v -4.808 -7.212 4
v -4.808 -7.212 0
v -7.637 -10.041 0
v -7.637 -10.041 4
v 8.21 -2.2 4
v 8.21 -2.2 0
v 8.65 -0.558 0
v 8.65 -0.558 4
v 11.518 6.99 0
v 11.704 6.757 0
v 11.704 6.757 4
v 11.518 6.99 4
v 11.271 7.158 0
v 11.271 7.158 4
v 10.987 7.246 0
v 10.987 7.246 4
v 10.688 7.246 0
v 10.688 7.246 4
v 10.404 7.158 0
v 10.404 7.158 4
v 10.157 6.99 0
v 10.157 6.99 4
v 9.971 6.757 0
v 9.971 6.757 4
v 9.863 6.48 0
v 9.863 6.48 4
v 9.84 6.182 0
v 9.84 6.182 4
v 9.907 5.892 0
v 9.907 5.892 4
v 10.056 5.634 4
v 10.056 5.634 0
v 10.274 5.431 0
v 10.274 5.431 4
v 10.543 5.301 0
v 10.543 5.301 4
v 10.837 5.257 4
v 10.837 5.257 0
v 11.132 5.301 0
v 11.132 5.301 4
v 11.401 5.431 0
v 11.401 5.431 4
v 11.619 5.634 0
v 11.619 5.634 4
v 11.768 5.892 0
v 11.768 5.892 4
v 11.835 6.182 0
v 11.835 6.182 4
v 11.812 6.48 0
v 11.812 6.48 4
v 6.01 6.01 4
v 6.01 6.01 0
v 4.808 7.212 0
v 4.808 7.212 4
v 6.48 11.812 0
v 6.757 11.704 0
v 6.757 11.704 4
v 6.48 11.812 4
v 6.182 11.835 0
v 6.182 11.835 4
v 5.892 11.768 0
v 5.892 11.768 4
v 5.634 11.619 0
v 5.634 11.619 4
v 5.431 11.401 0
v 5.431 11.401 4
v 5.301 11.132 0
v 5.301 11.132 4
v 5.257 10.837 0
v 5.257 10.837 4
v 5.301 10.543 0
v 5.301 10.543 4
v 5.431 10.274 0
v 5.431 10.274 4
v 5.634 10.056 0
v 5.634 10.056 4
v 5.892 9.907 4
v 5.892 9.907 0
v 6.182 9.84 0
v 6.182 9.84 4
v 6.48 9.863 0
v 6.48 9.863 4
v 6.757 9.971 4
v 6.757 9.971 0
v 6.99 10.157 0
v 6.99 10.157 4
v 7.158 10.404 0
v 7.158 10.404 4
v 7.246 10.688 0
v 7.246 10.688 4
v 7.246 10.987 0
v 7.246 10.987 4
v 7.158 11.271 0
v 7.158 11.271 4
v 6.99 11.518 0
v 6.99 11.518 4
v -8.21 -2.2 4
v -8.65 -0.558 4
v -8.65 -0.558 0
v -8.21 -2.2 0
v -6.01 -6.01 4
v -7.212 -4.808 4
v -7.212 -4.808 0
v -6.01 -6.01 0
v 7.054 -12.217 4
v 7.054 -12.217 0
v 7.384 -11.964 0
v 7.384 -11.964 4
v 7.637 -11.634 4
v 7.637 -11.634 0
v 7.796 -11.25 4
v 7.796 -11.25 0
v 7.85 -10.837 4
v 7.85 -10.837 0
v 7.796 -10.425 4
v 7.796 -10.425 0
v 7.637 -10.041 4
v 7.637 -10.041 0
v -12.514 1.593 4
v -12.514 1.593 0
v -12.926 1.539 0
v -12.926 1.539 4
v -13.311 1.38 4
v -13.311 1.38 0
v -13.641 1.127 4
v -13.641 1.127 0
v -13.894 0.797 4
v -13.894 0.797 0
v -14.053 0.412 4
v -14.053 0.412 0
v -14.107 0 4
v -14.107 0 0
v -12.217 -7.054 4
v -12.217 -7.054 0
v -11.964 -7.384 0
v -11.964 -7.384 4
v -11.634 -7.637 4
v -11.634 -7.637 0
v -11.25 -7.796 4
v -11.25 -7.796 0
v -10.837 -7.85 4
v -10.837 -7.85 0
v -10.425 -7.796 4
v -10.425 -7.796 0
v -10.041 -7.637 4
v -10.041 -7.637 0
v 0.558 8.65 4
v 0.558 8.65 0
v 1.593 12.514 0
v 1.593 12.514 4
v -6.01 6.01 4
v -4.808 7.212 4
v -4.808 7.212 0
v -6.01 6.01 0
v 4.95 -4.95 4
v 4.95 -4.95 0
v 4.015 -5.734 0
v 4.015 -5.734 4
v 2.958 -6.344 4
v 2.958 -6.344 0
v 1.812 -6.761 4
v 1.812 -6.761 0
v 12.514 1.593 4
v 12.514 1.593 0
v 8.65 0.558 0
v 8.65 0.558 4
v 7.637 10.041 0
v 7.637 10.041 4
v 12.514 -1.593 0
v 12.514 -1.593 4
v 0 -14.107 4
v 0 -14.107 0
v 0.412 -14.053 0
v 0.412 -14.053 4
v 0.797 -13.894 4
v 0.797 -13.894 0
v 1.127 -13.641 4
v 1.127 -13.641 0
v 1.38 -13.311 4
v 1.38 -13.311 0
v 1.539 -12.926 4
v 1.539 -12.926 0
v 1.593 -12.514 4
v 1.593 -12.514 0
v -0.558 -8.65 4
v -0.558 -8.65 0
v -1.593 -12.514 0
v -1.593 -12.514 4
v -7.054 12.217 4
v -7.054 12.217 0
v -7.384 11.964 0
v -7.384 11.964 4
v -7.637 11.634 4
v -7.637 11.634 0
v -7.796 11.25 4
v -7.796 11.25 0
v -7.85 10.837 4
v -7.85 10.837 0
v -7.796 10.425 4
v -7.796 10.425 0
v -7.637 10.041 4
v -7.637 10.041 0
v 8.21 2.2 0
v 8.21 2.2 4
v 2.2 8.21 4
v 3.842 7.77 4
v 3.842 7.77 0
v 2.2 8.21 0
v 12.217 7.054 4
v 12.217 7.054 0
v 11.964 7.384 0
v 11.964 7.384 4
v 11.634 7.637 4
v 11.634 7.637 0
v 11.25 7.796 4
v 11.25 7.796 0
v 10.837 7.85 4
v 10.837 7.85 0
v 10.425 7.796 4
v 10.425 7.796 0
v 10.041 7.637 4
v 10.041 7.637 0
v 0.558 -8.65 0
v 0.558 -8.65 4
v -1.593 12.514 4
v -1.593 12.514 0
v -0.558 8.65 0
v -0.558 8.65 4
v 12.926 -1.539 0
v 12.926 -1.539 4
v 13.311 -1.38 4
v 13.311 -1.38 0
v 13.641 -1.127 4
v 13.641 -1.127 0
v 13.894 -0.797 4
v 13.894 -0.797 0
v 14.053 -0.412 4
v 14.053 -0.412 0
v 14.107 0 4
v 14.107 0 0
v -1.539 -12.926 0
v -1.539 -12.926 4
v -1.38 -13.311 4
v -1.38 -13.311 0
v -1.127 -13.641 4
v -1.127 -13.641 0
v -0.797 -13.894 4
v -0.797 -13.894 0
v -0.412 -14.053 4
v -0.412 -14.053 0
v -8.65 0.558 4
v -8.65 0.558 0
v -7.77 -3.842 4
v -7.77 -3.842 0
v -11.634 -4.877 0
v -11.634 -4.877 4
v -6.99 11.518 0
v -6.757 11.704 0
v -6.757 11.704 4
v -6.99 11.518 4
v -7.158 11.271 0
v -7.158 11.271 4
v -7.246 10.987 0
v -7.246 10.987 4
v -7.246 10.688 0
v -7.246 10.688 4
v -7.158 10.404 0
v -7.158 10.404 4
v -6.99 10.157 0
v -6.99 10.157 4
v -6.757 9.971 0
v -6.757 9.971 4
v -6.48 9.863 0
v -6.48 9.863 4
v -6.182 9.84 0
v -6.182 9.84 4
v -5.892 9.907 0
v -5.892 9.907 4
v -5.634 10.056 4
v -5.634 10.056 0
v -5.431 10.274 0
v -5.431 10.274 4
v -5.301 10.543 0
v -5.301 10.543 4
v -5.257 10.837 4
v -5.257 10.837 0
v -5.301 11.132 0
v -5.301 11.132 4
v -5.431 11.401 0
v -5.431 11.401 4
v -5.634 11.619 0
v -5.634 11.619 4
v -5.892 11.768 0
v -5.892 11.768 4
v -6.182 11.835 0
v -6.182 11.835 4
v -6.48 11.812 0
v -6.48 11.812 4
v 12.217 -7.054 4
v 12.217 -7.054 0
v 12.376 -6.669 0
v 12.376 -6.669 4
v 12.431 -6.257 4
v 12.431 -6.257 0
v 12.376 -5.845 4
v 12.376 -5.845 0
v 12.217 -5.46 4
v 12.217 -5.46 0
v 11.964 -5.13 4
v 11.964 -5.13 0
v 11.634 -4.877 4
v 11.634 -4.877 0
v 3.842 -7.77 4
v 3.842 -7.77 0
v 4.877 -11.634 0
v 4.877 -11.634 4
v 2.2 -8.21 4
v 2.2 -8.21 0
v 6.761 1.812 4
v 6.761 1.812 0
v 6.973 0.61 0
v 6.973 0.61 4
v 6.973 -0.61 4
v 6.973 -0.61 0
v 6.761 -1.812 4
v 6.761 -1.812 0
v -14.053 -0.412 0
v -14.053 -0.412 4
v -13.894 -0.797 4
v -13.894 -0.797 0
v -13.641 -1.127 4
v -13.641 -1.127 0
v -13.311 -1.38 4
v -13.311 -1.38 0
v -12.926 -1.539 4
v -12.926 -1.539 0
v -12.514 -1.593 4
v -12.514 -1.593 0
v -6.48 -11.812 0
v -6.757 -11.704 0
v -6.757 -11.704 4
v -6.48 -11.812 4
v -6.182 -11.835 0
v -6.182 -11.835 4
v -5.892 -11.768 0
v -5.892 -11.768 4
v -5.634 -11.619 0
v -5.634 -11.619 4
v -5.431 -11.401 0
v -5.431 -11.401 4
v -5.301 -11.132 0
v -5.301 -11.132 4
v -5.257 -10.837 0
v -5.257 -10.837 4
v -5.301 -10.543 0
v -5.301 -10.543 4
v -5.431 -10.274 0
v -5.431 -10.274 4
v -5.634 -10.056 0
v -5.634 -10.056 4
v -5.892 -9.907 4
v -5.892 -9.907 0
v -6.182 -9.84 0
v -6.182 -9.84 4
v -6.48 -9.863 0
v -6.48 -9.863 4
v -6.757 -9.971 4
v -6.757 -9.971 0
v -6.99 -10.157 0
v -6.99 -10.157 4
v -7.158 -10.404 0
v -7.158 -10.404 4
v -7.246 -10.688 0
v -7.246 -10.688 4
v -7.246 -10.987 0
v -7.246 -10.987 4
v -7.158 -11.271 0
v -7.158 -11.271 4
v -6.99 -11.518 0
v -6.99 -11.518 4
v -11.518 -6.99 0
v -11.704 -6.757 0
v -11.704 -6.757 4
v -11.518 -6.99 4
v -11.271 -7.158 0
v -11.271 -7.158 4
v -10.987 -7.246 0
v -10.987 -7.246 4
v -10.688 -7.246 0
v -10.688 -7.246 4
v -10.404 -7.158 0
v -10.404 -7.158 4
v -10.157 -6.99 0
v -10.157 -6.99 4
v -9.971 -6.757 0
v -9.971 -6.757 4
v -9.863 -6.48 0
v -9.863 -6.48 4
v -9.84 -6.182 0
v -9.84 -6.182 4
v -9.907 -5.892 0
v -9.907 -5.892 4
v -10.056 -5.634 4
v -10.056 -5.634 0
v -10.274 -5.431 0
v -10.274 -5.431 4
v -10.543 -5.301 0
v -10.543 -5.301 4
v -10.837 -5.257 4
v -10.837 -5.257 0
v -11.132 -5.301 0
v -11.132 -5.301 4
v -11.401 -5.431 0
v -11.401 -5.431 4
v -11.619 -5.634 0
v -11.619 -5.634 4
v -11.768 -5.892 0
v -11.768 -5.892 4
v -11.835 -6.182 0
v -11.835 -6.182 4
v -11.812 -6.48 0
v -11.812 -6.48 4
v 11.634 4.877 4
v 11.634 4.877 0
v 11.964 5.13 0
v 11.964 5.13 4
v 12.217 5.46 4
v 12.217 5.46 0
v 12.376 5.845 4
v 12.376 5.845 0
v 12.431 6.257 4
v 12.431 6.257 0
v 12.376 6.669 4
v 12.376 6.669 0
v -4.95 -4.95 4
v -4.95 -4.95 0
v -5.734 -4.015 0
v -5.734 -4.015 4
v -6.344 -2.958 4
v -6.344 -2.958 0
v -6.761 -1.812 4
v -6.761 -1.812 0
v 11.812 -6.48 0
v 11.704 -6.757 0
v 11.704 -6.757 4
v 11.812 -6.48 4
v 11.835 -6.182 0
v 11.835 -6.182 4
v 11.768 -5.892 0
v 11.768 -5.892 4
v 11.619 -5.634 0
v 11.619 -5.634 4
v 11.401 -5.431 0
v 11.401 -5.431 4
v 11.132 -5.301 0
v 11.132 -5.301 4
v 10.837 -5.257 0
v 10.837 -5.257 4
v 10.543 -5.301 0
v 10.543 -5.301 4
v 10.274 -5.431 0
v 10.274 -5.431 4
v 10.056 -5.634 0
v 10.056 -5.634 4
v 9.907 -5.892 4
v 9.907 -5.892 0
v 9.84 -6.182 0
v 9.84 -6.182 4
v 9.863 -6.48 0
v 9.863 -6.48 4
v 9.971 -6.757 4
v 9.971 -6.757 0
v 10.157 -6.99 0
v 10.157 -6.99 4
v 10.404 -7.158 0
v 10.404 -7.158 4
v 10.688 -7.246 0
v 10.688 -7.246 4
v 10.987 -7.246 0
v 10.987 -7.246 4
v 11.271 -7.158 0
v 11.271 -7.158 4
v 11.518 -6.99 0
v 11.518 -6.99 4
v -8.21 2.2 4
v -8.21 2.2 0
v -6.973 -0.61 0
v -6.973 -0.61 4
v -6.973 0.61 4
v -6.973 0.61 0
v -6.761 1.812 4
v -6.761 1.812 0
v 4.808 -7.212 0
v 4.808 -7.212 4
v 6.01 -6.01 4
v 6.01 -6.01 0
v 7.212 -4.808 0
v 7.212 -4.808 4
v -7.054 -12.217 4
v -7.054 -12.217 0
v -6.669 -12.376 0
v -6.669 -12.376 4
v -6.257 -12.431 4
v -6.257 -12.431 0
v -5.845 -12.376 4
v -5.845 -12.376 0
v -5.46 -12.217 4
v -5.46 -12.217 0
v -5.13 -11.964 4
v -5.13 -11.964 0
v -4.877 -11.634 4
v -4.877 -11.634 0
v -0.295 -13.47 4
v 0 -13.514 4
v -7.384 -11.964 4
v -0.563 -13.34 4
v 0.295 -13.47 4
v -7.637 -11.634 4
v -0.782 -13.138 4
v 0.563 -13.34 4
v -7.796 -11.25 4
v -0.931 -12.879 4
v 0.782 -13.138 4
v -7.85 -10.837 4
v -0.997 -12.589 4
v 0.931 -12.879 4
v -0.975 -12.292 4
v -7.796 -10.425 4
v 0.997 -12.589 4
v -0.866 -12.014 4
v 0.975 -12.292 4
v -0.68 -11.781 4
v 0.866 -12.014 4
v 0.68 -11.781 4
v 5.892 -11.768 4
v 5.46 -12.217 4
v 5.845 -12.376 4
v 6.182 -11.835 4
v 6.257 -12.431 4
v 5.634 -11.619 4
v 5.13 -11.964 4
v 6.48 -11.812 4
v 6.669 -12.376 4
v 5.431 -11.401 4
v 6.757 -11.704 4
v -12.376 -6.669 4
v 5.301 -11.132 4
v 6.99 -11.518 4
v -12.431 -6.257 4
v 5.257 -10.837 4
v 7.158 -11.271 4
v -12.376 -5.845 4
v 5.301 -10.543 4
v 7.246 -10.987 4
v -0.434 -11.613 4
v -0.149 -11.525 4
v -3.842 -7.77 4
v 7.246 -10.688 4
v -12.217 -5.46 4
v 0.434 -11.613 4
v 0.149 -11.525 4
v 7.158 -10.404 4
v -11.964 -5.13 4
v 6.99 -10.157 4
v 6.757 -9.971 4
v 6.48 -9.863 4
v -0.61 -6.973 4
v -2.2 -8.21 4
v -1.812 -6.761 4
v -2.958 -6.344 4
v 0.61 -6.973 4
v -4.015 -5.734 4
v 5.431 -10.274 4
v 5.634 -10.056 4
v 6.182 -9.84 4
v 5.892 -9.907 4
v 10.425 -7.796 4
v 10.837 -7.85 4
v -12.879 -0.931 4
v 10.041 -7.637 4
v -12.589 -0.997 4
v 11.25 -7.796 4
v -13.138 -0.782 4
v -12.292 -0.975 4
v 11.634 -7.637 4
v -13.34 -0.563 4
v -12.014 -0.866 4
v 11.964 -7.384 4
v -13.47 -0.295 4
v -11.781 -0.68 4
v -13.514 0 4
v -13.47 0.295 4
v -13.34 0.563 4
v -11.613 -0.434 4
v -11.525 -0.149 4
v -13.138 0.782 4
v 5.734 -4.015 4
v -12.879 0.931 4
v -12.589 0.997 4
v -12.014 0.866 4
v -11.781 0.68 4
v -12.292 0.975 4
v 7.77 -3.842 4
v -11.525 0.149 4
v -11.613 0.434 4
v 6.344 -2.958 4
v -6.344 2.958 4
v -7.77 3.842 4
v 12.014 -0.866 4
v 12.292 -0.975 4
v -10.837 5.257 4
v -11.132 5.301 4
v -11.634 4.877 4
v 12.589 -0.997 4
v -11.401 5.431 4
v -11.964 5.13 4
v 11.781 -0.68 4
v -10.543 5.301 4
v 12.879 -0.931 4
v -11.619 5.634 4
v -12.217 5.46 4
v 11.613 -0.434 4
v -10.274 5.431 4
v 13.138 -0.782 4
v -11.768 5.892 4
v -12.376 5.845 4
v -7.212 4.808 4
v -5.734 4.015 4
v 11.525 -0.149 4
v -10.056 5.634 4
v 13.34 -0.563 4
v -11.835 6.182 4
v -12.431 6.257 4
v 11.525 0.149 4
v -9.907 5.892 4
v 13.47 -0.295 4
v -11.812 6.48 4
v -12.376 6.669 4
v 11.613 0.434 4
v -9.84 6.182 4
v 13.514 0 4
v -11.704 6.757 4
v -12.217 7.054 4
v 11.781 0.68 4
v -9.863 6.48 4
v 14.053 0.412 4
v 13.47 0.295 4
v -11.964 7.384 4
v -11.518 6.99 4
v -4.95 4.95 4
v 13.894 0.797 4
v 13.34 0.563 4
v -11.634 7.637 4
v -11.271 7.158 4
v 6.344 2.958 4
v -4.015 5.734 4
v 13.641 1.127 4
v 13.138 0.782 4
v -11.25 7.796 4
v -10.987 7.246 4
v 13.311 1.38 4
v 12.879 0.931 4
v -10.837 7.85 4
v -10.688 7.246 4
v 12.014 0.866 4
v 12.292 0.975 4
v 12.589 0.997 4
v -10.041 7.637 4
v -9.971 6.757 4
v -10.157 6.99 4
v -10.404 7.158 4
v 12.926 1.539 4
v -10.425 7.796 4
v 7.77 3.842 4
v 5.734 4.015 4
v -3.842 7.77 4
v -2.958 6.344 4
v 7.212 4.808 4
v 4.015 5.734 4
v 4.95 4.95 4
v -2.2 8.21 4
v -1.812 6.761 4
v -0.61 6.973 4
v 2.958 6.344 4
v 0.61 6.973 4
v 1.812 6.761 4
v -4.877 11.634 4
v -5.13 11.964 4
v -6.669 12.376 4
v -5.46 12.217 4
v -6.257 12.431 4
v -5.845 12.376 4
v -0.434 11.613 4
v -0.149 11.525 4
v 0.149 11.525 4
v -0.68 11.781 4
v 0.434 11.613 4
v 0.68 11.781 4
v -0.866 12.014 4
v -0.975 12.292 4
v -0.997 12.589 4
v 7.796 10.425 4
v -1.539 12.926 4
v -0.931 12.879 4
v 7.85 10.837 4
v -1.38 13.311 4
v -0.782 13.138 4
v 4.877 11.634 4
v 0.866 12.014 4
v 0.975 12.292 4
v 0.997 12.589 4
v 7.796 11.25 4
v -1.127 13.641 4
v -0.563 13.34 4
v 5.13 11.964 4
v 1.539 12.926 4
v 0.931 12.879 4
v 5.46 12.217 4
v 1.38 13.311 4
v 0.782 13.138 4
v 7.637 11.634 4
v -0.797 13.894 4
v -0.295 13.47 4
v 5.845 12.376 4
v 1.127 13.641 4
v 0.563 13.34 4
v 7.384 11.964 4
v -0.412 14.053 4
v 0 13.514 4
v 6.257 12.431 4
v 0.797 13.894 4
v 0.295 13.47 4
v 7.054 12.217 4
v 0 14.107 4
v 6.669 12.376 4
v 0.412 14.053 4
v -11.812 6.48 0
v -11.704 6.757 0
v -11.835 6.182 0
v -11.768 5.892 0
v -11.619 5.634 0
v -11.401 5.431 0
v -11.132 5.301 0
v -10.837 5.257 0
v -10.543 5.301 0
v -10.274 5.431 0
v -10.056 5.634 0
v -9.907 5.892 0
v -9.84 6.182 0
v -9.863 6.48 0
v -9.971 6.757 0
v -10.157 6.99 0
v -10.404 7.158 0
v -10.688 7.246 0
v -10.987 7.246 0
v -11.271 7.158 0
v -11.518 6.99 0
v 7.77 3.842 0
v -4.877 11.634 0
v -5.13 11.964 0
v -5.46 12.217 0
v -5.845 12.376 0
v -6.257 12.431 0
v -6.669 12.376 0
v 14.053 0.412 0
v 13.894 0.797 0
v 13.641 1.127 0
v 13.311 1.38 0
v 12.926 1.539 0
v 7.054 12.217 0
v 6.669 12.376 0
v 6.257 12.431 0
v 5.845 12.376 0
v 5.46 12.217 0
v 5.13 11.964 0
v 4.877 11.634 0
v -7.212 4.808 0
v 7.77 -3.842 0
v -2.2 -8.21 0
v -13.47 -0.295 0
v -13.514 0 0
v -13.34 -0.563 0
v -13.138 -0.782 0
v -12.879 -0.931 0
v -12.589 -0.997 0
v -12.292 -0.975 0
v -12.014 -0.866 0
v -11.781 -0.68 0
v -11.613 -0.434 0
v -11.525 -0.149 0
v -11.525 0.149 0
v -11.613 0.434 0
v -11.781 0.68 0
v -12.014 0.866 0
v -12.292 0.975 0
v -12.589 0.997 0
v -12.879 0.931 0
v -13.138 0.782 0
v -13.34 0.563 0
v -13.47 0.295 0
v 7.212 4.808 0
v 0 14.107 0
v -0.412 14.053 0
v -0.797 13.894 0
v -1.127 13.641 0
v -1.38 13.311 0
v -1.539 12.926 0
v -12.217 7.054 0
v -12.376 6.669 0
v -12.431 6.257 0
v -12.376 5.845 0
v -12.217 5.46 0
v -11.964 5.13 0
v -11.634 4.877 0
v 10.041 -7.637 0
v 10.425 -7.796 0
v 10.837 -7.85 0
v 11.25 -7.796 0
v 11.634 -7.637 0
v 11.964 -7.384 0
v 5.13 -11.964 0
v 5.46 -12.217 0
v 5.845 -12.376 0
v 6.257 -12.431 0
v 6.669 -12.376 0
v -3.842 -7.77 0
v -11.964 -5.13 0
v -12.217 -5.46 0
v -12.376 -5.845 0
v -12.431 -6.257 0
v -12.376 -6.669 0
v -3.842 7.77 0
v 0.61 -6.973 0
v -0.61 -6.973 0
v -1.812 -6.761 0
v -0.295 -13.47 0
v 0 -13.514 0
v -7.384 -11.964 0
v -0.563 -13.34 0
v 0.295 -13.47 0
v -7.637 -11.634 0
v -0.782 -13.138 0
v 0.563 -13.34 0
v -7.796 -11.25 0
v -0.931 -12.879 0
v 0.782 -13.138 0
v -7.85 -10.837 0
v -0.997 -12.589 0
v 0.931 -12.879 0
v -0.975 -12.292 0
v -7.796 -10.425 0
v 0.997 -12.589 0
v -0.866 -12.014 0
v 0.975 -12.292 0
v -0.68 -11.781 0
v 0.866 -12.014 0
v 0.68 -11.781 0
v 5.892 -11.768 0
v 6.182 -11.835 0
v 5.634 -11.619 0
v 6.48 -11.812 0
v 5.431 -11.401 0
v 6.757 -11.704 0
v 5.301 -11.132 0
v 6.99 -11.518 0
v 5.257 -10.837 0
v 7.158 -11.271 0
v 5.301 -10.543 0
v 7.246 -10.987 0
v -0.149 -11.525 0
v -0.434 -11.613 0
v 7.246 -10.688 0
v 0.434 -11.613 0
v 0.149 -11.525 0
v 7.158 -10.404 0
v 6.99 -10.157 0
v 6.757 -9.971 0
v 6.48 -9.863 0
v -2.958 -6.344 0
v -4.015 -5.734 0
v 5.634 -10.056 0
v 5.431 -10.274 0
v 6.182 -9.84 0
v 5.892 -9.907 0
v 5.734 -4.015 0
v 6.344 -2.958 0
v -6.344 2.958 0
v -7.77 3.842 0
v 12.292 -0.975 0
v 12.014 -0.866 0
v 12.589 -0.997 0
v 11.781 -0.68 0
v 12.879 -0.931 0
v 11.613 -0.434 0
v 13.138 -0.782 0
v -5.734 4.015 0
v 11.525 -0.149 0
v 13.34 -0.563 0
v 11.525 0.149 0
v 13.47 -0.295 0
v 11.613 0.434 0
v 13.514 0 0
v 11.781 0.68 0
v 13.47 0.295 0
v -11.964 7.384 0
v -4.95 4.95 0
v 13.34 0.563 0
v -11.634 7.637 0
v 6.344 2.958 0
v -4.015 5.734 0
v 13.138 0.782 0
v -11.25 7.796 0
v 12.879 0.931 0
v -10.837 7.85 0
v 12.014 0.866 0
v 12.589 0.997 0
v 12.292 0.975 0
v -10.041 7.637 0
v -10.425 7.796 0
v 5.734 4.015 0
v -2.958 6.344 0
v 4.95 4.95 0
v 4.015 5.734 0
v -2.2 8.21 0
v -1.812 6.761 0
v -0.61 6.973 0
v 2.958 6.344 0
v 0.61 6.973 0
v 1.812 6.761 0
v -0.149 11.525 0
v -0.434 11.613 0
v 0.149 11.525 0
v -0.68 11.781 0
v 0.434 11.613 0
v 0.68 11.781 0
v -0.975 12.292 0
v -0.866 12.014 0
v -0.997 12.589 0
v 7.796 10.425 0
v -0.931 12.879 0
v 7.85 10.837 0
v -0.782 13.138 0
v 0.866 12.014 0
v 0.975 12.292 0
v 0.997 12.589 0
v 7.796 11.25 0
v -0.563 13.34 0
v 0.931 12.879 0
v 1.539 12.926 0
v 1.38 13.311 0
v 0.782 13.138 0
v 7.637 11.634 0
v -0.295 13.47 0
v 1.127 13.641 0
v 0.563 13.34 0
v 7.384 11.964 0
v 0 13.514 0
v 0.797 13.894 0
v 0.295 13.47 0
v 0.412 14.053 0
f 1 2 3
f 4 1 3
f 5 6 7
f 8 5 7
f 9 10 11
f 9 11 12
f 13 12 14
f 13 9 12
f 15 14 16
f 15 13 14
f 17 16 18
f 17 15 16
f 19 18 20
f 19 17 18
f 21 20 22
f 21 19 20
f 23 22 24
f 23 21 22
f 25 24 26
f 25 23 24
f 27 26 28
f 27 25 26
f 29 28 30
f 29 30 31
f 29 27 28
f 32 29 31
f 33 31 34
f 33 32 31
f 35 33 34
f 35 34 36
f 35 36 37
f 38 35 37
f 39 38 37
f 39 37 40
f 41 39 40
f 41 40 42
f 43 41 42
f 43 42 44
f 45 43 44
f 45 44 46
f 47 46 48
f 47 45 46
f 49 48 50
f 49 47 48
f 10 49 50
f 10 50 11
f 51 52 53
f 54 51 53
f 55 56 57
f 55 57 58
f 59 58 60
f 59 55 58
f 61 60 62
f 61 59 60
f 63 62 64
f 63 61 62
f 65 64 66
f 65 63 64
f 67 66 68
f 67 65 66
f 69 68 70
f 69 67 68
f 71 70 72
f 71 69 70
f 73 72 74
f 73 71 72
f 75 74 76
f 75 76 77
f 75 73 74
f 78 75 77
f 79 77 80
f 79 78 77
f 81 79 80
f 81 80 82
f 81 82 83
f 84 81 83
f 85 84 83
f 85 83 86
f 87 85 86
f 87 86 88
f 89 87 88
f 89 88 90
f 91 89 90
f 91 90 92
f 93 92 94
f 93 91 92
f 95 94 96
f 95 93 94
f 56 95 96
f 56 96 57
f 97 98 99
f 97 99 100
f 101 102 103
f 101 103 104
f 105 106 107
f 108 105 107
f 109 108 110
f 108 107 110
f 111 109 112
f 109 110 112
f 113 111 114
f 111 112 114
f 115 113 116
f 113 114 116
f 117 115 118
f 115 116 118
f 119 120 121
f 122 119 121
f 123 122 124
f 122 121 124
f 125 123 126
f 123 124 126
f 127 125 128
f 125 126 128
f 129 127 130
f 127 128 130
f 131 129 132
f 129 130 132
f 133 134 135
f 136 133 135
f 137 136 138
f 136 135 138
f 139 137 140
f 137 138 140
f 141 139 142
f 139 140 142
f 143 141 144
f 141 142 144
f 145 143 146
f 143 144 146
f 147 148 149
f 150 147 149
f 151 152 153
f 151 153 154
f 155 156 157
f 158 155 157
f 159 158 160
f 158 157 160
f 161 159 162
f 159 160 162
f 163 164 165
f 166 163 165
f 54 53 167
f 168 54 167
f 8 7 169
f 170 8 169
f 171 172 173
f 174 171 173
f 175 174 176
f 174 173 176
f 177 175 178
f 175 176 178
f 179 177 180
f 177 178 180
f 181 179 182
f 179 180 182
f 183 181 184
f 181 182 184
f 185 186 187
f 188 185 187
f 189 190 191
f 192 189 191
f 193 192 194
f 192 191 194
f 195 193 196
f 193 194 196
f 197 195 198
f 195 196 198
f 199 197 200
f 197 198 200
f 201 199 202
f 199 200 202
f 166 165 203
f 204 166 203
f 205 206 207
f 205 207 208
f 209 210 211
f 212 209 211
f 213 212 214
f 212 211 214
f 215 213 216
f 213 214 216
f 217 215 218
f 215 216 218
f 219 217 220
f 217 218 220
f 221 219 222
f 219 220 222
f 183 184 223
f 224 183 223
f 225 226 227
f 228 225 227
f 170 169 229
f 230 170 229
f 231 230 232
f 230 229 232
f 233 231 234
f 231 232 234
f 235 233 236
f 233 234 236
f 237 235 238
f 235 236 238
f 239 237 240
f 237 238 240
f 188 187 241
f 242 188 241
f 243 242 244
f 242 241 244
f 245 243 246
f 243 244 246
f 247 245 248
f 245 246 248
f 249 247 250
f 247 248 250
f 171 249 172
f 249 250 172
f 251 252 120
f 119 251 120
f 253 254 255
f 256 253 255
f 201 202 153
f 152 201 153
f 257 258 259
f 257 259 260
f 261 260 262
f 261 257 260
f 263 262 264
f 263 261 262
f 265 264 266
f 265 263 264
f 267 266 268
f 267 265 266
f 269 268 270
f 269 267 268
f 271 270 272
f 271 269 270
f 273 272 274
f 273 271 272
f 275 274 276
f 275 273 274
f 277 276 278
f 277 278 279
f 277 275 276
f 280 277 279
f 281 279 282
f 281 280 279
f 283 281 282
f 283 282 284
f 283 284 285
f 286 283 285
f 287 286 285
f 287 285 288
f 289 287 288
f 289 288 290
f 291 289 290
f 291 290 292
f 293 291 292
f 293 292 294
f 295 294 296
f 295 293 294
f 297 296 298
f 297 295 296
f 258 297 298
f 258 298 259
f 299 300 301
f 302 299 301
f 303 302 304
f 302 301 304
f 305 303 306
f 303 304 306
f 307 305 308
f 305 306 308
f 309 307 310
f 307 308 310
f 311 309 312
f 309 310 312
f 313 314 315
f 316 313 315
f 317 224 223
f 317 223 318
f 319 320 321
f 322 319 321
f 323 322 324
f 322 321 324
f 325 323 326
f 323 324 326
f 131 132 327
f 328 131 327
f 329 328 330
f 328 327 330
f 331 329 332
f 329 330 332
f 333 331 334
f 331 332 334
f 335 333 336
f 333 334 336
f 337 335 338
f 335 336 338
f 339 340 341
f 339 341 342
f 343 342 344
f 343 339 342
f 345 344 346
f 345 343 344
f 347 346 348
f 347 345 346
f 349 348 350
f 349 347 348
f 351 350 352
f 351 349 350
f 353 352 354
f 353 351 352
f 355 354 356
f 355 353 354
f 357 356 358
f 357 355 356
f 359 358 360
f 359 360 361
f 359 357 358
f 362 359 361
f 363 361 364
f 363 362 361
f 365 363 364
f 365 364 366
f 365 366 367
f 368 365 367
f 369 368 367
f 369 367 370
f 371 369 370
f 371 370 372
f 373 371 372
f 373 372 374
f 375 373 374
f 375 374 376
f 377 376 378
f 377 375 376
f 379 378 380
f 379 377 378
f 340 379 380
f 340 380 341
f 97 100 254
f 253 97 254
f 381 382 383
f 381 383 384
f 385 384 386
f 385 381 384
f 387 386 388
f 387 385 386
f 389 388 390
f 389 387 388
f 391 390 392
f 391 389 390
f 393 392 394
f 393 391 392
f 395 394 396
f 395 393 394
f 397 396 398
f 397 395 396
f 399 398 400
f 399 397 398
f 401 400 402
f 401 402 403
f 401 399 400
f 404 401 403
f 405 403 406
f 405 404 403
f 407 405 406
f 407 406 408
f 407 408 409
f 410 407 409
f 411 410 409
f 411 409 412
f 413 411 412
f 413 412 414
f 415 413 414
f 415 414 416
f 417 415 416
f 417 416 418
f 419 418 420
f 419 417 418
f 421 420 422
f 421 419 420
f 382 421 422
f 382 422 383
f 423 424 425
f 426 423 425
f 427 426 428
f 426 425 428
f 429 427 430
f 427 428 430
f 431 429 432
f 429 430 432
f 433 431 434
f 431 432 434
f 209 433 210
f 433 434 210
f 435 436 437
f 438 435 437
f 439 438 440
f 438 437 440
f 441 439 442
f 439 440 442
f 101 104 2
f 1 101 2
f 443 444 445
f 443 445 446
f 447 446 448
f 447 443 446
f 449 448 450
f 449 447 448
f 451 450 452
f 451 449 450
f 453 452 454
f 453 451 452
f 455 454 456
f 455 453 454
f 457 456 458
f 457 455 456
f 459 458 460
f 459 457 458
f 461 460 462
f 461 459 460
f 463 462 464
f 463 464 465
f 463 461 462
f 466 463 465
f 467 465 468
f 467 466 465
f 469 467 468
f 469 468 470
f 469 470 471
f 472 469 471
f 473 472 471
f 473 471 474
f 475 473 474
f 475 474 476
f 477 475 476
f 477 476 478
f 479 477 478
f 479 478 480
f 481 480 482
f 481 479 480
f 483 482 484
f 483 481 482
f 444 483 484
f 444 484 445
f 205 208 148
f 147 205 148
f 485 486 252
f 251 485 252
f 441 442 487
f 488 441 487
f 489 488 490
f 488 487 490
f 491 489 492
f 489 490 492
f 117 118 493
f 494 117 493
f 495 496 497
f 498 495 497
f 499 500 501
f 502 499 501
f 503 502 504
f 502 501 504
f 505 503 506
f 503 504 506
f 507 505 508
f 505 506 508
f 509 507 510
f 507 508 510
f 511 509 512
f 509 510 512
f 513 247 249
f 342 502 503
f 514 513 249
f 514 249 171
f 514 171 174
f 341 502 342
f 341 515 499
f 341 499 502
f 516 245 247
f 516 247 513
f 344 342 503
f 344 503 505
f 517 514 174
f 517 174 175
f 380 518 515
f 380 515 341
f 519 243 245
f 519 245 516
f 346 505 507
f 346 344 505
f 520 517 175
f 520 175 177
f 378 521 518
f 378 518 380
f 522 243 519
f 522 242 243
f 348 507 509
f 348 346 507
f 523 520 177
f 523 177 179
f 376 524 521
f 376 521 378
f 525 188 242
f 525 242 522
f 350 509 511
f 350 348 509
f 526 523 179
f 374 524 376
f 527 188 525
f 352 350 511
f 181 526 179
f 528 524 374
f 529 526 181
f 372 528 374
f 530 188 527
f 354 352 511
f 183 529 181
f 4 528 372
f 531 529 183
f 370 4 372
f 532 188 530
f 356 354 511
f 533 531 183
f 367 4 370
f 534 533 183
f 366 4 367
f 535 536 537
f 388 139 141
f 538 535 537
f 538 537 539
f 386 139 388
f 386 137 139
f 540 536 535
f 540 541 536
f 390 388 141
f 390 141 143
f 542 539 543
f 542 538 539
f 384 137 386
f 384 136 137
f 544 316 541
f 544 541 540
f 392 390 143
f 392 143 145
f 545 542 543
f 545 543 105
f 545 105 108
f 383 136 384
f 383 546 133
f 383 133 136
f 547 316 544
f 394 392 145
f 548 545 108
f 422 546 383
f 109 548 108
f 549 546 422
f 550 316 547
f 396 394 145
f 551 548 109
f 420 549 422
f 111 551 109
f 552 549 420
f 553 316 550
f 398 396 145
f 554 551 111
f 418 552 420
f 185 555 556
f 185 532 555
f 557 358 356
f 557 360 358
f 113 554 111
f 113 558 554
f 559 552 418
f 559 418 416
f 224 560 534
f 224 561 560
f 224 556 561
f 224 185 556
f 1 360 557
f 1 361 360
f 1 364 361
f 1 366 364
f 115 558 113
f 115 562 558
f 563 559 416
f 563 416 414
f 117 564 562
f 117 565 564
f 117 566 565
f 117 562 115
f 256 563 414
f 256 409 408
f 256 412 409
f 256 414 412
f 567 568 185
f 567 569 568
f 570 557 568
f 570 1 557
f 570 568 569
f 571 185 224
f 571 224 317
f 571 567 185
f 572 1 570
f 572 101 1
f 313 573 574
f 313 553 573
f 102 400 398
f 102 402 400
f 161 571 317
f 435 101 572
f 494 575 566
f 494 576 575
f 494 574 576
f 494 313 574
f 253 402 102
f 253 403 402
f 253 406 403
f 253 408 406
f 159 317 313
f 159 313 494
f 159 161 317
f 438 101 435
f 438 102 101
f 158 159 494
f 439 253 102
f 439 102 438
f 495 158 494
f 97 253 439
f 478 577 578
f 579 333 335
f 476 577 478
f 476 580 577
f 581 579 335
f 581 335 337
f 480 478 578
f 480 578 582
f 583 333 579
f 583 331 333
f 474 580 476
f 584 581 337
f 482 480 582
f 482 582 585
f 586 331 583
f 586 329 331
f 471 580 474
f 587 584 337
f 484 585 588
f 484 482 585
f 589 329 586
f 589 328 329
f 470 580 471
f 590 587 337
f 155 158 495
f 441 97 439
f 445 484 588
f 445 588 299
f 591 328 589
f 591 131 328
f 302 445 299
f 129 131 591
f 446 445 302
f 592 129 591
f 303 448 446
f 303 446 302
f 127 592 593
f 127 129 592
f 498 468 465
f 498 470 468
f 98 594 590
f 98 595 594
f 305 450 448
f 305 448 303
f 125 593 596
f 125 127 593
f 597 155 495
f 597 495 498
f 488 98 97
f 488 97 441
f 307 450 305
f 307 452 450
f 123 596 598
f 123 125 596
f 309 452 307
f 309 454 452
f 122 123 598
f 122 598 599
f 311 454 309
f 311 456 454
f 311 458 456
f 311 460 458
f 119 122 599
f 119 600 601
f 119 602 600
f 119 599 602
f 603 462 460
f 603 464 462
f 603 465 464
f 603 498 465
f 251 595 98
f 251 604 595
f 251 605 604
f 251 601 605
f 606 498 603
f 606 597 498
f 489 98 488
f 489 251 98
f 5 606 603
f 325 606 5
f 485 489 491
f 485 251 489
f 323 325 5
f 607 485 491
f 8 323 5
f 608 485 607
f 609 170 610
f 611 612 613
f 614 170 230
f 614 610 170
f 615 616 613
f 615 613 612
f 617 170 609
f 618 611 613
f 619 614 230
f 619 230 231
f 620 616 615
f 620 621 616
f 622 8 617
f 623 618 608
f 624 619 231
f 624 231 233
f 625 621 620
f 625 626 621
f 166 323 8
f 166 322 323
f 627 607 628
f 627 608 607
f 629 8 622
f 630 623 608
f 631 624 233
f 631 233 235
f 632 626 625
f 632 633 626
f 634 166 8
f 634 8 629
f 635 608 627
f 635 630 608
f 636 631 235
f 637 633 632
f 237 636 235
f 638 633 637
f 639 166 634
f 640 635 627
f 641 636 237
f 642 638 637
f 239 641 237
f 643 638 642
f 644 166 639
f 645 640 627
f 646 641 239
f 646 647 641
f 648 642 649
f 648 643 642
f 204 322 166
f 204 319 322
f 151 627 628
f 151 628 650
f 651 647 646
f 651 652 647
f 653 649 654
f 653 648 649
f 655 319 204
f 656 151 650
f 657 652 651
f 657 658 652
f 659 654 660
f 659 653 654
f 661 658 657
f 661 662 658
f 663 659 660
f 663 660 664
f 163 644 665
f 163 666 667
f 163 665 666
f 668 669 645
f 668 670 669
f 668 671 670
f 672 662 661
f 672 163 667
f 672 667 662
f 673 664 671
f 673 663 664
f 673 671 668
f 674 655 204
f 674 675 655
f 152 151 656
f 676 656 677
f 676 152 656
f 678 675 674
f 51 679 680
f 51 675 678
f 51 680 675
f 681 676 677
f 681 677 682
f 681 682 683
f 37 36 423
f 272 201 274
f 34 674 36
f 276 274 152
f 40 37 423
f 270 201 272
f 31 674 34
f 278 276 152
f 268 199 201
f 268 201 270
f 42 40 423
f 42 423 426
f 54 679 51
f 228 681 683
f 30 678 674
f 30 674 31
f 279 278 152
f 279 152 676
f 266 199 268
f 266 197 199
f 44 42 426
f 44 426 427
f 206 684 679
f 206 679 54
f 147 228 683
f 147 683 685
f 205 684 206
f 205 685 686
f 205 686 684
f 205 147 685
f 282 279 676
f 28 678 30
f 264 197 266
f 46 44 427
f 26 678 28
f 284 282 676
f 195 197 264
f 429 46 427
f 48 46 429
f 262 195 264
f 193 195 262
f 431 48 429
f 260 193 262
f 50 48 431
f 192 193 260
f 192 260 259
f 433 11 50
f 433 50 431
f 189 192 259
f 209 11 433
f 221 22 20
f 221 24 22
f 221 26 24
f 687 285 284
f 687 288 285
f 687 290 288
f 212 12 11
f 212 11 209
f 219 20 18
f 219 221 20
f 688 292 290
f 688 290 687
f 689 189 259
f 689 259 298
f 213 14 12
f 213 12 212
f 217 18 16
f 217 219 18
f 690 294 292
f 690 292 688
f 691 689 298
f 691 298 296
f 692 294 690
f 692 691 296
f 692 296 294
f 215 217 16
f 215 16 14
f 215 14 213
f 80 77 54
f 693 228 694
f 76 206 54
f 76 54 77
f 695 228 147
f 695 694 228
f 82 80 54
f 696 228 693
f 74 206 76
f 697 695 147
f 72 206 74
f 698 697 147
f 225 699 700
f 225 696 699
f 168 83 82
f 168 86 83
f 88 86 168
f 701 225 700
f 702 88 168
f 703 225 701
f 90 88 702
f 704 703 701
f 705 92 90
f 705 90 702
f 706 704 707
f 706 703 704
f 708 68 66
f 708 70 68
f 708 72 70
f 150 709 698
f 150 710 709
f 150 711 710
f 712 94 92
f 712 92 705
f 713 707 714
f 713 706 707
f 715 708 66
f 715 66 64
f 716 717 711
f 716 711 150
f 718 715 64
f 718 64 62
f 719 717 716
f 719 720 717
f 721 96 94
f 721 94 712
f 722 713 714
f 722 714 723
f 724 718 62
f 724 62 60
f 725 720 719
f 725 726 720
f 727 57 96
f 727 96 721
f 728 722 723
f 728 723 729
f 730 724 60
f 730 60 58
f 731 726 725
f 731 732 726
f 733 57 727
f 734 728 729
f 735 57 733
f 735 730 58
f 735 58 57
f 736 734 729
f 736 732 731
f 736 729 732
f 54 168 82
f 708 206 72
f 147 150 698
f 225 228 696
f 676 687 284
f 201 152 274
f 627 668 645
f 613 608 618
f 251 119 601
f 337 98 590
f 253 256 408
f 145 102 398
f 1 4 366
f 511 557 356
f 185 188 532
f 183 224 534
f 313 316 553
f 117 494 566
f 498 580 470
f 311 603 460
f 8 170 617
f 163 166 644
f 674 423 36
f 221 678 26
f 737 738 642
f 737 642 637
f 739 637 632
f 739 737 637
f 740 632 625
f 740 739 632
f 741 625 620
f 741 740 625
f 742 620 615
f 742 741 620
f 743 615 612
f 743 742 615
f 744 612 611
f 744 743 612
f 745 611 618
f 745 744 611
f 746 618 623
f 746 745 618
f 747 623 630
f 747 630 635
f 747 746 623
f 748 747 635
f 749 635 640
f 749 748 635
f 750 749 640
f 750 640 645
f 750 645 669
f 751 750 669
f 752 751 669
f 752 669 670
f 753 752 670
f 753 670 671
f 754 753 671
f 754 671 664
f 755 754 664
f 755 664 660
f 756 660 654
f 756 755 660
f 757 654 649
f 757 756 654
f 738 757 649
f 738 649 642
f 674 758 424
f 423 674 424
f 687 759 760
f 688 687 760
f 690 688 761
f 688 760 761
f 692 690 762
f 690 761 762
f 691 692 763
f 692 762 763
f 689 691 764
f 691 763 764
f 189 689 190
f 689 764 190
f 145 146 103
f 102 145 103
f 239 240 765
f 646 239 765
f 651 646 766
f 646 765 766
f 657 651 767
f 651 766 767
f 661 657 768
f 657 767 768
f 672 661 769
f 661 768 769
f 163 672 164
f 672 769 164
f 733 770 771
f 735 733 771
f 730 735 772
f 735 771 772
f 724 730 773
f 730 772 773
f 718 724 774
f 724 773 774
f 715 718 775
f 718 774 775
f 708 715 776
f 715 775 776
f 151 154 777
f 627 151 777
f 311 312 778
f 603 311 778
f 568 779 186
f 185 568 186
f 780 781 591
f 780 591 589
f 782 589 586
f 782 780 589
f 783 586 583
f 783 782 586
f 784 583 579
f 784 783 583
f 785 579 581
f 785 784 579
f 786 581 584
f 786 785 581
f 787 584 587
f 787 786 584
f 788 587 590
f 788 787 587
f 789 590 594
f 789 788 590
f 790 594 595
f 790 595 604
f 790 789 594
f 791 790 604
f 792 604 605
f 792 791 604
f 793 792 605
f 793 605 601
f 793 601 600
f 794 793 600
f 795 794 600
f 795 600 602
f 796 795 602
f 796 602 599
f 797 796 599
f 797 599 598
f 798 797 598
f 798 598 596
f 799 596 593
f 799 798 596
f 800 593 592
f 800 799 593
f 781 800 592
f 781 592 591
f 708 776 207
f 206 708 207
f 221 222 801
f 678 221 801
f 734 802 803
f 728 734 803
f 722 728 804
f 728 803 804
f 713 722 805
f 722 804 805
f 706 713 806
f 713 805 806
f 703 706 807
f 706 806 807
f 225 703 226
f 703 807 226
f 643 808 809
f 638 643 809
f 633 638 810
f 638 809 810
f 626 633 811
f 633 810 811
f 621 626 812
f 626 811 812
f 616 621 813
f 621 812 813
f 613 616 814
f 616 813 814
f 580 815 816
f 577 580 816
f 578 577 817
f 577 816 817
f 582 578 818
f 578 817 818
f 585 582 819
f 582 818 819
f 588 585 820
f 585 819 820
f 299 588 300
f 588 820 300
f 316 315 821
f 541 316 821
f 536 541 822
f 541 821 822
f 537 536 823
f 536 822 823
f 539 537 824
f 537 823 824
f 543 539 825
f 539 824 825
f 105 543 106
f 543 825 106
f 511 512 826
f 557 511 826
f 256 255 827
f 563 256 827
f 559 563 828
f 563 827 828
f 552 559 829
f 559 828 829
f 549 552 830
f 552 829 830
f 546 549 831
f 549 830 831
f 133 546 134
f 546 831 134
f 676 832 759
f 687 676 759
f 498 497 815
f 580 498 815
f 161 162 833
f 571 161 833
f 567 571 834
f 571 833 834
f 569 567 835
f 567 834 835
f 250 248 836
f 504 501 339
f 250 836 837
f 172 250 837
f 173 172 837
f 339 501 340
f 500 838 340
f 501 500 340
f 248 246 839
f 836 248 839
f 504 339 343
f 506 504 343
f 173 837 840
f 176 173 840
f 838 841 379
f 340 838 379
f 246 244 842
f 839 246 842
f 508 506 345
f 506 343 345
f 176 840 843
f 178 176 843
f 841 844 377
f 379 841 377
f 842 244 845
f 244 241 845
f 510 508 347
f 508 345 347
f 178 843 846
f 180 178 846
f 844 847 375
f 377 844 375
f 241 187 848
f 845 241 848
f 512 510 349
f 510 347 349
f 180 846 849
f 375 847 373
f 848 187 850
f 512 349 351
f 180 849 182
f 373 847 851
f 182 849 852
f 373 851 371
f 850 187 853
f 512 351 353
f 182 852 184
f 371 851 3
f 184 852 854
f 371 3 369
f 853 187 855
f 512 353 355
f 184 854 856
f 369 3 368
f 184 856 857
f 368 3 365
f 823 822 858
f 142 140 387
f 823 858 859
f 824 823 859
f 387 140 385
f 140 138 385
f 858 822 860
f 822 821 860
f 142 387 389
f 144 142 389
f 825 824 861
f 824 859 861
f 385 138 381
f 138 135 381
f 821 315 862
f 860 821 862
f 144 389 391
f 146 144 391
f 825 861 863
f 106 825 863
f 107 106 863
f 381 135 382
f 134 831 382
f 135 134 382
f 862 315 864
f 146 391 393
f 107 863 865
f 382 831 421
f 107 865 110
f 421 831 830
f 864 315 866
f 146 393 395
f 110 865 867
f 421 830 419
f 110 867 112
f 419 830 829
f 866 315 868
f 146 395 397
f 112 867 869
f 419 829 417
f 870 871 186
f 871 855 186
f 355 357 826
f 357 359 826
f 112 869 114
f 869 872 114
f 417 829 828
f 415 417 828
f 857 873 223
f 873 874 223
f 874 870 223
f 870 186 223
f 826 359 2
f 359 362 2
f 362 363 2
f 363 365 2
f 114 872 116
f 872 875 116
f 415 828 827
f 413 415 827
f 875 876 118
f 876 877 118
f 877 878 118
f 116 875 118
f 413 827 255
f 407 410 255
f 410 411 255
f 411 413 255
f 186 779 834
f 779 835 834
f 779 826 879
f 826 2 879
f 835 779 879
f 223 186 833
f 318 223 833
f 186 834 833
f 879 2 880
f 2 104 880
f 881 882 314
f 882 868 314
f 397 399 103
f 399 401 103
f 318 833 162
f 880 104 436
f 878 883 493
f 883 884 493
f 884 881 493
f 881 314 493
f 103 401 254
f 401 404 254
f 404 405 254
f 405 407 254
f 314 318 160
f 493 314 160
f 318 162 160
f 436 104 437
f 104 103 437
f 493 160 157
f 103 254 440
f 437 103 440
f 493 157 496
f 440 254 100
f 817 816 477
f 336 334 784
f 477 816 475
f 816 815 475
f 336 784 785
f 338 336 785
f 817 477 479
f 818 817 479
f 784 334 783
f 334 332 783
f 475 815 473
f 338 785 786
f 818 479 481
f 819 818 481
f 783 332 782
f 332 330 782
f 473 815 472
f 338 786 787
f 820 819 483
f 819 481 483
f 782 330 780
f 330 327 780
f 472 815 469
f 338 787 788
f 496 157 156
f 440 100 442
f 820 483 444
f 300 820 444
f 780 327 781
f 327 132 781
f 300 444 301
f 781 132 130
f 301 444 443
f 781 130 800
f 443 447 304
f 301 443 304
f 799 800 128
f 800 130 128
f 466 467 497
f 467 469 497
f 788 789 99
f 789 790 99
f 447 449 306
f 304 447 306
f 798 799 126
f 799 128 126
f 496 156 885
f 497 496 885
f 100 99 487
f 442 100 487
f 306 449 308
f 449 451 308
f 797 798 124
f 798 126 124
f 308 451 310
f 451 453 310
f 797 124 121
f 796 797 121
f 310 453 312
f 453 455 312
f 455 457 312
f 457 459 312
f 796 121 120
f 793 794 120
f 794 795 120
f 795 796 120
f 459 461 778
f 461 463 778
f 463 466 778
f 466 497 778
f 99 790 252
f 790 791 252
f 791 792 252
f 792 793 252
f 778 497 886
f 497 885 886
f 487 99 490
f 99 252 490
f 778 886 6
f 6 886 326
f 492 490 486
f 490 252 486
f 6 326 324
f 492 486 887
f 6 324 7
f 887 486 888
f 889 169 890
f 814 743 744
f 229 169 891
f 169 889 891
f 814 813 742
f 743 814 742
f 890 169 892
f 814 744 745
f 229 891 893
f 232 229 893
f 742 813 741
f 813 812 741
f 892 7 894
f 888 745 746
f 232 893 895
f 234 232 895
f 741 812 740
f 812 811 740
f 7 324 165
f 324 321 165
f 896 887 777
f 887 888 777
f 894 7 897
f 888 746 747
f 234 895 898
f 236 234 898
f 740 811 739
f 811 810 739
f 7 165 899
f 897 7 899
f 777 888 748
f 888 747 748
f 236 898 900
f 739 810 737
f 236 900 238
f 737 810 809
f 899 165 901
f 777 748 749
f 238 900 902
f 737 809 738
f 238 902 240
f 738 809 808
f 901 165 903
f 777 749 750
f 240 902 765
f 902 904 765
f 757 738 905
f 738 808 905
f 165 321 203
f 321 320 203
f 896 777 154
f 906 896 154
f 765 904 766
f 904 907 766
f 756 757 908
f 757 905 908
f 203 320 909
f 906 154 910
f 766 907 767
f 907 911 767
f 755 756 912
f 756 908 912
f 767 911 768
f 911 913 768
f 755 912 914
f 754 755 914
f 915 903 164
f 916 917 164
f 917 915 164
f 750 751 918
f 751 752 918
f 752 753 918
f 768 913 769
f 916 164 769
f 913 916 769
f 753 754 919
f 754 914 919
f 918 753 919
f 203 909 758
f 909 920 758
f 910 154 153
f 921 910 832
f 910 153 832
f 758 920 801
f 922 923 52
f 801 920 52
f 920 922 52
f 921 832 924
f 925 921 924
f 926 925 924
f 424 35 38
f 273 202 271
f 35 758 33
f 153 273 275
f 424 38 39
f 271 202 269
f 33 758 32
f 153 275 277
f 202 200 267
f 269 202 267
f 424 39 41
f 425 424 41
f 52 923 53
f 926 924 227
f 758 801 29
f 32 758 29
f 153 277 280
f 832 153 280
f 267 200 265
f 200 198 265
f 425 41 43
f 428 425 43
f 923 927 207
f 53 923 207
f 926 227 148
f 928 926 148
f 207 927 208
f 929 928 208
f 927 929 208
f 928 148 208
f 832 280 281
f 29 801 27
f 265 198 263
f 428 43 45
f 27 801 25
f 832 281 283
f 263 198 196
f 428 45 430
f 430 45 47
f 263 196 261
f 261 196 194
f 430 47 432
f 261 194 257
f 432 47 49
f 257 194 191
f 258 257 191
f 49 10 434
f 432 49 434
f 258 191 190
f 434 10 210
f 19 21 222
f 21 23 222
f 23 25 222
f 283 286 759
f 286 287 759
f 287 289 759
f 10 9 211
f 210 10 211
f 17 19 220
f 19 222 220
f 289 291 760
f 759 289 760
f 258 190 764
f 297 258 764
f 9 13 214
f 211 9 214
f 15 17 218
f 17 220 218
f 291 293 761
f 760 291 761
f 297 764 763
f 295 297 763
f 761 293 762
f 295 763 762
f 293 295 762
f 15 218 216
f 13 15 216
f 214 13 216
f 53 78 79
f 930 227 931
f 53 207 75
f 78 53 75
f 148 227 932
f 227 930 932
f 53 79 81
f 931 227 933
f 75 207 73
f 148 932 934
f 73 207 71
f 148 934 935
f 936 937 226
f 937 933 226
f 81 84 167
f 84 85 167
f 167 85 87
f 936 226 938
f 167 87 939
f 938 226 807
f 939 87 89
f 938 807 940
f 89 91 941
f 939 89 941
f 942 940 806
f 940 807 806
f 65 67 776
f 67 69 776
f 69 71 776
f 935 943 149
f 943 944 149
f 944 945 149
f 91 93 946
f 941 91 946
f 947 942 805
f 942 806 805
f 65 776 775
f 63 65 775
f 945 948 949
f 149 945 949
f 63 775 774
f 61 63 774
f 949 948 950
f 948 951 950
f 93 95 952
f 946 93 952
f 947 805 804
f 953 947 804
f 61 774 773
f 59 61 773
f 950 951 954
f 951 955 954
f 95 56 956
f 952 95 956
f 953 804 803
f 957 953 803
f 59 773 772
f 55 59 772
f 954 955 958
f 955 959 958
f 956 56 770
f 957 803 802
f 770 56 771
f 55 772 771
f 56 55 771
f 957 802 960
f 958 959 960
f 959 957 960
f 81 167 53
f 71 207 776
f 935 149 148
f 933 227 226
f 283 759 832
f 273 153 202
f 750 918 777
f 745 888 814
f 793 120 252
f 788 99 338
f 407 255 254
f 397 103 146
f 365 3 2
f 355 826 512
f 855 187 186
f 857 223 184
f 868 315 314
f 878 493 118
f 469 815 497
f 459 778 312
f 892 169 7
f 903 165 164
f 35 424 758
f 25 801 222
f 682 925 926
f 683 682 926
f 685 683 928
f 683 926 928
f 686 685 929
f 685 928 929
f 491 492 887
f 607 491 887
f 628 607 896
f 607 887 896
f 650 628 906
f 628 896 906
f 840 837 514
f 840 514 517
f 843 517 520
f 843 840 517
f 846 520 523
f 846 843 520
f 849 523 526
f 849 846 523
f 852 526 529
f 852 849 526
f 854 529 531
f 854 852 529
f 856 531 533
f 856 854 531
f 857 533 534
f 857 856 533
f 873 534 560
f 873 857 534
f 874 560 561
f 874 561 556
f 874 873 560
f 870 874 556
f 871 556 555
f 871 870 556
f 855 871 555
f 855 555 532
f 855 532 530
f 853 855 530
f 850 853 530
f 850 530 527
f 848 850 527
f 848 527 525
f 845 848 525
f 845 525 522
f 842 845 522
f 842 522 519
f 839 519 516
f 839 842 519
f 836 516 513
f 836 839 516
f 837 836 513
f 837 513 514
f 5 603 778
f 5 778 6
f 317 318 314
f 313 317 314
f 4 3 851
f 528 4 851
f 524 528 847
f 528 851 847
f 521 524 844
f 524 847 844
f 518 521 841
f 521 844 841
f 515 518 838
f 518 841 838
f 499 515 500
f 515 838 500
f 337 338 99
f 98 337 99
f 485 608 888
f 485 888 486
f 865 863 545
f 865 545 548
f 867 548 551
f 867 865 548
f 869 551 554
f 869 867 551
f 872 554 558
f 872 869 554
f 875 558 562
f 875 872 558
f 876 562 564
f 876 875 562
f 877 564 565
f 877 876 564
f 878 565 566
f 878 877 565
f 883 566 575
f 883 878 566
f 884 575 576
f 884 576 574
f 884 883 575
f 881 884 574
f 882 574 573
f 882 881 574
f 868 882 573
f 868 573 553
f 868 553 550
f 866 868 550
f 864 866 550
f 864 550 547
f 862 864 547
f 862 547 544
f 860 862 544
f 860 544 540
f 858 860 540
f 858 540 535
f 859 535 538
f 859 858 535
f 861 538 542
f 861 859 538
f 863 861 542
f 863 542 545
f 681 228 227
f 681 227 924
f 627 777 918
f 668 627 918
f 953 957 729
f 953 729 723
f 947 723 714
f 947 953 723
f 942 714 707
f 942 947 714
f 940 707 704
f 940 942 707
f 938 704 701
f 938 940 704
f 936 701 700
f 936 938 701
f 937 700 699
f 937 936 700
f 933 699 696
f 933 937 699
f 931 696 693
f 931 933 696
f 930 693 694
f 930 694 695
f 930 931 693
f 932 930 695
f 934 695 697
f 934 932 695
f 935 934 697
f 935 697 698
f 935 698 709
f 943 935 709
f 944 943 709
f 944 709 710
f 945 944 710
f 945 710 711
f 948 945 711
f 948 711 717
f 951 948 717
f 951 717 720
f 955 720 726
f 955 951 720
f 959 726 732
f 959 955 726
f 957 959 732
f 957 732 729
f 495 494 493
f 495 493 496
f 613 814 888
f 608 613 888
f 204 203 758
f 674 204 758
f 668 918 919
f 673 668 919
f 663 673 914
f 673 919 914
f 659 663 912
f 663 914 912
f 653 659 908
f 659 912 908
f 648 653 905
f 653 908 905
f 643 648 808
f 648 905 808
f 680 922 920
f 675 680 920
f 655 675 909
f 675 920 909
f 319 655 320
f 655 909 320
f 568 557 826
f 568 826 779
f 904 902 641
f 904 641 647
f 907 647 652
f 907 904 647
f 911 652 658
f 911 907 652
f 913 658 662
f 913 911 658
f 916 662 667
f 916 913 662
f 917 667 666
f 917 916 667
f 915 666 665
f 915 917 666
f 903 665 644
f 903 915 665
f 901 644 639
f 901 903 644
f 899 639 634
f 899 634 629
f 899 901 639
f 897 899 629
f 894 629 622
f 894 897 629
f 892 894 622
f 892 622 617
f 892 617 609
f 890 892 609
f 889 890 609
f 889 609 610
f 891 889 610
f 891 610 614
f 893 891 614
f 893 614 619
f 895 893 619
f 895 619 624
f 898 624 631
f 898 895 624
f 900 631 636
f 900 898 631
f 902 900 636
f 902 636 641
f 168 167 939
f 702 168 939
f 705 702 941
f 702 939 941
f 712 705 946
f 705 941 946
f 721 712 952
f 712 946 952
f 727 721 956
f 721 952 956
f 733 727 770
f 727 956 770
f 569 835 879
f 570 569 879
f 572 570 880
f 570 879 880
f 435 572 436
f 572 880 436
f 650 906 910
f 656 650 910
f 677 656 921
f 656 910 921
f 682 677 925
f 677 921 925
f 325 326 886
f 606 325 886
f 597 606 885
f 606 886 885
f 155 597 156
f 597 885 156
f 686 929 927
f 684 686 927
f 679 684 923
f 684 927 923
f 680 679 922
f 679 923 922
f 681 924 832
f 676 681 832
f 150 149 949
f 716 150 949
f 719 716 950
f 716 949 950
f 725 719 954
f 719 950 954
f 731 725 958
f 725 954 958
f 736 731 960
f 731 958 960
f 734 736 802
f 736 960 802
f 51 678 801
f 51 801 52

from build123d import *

# Parameters (mm, degrees)
F0_R     = 1
F1_DEPTH = 4
F3_COUNT = 12


with BuildPart() as f1:
    # F0 (on Top) → F1 (new body)
    with BuildSketch(Plane.XY):
        with BuildLine():
            Line((8.6503619001, 0.5578879787), (8.2103695235, 2.1999618834))
            Line((8.2103695235, 2.1999618834), (6.761480784, 1.8117333157))
            ThreePointArc((6.761480784, 1.8117333157), (7, 0), (6.761480784, -1.8117333157))
            Line((6.761480784, -1.8117333157), (8.2103695235, -2.1999618834))
            Line((8.2103695235, -2.1999618834), (8.6503619001, -0.5578879787))
            Line((8.6503619001, -0.5578879787), (12.5140652053, -1.5931641591))
            ThreePointArc((12.5140652053, -1.5931641591), (13.6406023857, -1.1265371804), (14.1072293644, 0))
            ThreePointArc((14.1072293644, 0), (13.6406023857, 1.1265371804), (12.5140652053, 1.5931641591))
            Line((12.5140652053, 1.5931641591), (8.6503619001, 0.5578879787))
        make_face()
        with Locations((12.5140652053, 0)):
            Circle(F0_R, mode=Mode.SUBTRACT)
    extrude(amount=F1_DEPTH)

    # F3: F1 ×12 about axis
    f3_axis = Axis((0, 0, -5.4754605517), (0, 0, -1))


with BuildPart() as f1_1:
    add(f1.part)
    for i in range(1, F3_COUNT):
        add(f1.part.rotate(f3_axis, i * 360 / F3_COUNT))


solid = f1_1.part
